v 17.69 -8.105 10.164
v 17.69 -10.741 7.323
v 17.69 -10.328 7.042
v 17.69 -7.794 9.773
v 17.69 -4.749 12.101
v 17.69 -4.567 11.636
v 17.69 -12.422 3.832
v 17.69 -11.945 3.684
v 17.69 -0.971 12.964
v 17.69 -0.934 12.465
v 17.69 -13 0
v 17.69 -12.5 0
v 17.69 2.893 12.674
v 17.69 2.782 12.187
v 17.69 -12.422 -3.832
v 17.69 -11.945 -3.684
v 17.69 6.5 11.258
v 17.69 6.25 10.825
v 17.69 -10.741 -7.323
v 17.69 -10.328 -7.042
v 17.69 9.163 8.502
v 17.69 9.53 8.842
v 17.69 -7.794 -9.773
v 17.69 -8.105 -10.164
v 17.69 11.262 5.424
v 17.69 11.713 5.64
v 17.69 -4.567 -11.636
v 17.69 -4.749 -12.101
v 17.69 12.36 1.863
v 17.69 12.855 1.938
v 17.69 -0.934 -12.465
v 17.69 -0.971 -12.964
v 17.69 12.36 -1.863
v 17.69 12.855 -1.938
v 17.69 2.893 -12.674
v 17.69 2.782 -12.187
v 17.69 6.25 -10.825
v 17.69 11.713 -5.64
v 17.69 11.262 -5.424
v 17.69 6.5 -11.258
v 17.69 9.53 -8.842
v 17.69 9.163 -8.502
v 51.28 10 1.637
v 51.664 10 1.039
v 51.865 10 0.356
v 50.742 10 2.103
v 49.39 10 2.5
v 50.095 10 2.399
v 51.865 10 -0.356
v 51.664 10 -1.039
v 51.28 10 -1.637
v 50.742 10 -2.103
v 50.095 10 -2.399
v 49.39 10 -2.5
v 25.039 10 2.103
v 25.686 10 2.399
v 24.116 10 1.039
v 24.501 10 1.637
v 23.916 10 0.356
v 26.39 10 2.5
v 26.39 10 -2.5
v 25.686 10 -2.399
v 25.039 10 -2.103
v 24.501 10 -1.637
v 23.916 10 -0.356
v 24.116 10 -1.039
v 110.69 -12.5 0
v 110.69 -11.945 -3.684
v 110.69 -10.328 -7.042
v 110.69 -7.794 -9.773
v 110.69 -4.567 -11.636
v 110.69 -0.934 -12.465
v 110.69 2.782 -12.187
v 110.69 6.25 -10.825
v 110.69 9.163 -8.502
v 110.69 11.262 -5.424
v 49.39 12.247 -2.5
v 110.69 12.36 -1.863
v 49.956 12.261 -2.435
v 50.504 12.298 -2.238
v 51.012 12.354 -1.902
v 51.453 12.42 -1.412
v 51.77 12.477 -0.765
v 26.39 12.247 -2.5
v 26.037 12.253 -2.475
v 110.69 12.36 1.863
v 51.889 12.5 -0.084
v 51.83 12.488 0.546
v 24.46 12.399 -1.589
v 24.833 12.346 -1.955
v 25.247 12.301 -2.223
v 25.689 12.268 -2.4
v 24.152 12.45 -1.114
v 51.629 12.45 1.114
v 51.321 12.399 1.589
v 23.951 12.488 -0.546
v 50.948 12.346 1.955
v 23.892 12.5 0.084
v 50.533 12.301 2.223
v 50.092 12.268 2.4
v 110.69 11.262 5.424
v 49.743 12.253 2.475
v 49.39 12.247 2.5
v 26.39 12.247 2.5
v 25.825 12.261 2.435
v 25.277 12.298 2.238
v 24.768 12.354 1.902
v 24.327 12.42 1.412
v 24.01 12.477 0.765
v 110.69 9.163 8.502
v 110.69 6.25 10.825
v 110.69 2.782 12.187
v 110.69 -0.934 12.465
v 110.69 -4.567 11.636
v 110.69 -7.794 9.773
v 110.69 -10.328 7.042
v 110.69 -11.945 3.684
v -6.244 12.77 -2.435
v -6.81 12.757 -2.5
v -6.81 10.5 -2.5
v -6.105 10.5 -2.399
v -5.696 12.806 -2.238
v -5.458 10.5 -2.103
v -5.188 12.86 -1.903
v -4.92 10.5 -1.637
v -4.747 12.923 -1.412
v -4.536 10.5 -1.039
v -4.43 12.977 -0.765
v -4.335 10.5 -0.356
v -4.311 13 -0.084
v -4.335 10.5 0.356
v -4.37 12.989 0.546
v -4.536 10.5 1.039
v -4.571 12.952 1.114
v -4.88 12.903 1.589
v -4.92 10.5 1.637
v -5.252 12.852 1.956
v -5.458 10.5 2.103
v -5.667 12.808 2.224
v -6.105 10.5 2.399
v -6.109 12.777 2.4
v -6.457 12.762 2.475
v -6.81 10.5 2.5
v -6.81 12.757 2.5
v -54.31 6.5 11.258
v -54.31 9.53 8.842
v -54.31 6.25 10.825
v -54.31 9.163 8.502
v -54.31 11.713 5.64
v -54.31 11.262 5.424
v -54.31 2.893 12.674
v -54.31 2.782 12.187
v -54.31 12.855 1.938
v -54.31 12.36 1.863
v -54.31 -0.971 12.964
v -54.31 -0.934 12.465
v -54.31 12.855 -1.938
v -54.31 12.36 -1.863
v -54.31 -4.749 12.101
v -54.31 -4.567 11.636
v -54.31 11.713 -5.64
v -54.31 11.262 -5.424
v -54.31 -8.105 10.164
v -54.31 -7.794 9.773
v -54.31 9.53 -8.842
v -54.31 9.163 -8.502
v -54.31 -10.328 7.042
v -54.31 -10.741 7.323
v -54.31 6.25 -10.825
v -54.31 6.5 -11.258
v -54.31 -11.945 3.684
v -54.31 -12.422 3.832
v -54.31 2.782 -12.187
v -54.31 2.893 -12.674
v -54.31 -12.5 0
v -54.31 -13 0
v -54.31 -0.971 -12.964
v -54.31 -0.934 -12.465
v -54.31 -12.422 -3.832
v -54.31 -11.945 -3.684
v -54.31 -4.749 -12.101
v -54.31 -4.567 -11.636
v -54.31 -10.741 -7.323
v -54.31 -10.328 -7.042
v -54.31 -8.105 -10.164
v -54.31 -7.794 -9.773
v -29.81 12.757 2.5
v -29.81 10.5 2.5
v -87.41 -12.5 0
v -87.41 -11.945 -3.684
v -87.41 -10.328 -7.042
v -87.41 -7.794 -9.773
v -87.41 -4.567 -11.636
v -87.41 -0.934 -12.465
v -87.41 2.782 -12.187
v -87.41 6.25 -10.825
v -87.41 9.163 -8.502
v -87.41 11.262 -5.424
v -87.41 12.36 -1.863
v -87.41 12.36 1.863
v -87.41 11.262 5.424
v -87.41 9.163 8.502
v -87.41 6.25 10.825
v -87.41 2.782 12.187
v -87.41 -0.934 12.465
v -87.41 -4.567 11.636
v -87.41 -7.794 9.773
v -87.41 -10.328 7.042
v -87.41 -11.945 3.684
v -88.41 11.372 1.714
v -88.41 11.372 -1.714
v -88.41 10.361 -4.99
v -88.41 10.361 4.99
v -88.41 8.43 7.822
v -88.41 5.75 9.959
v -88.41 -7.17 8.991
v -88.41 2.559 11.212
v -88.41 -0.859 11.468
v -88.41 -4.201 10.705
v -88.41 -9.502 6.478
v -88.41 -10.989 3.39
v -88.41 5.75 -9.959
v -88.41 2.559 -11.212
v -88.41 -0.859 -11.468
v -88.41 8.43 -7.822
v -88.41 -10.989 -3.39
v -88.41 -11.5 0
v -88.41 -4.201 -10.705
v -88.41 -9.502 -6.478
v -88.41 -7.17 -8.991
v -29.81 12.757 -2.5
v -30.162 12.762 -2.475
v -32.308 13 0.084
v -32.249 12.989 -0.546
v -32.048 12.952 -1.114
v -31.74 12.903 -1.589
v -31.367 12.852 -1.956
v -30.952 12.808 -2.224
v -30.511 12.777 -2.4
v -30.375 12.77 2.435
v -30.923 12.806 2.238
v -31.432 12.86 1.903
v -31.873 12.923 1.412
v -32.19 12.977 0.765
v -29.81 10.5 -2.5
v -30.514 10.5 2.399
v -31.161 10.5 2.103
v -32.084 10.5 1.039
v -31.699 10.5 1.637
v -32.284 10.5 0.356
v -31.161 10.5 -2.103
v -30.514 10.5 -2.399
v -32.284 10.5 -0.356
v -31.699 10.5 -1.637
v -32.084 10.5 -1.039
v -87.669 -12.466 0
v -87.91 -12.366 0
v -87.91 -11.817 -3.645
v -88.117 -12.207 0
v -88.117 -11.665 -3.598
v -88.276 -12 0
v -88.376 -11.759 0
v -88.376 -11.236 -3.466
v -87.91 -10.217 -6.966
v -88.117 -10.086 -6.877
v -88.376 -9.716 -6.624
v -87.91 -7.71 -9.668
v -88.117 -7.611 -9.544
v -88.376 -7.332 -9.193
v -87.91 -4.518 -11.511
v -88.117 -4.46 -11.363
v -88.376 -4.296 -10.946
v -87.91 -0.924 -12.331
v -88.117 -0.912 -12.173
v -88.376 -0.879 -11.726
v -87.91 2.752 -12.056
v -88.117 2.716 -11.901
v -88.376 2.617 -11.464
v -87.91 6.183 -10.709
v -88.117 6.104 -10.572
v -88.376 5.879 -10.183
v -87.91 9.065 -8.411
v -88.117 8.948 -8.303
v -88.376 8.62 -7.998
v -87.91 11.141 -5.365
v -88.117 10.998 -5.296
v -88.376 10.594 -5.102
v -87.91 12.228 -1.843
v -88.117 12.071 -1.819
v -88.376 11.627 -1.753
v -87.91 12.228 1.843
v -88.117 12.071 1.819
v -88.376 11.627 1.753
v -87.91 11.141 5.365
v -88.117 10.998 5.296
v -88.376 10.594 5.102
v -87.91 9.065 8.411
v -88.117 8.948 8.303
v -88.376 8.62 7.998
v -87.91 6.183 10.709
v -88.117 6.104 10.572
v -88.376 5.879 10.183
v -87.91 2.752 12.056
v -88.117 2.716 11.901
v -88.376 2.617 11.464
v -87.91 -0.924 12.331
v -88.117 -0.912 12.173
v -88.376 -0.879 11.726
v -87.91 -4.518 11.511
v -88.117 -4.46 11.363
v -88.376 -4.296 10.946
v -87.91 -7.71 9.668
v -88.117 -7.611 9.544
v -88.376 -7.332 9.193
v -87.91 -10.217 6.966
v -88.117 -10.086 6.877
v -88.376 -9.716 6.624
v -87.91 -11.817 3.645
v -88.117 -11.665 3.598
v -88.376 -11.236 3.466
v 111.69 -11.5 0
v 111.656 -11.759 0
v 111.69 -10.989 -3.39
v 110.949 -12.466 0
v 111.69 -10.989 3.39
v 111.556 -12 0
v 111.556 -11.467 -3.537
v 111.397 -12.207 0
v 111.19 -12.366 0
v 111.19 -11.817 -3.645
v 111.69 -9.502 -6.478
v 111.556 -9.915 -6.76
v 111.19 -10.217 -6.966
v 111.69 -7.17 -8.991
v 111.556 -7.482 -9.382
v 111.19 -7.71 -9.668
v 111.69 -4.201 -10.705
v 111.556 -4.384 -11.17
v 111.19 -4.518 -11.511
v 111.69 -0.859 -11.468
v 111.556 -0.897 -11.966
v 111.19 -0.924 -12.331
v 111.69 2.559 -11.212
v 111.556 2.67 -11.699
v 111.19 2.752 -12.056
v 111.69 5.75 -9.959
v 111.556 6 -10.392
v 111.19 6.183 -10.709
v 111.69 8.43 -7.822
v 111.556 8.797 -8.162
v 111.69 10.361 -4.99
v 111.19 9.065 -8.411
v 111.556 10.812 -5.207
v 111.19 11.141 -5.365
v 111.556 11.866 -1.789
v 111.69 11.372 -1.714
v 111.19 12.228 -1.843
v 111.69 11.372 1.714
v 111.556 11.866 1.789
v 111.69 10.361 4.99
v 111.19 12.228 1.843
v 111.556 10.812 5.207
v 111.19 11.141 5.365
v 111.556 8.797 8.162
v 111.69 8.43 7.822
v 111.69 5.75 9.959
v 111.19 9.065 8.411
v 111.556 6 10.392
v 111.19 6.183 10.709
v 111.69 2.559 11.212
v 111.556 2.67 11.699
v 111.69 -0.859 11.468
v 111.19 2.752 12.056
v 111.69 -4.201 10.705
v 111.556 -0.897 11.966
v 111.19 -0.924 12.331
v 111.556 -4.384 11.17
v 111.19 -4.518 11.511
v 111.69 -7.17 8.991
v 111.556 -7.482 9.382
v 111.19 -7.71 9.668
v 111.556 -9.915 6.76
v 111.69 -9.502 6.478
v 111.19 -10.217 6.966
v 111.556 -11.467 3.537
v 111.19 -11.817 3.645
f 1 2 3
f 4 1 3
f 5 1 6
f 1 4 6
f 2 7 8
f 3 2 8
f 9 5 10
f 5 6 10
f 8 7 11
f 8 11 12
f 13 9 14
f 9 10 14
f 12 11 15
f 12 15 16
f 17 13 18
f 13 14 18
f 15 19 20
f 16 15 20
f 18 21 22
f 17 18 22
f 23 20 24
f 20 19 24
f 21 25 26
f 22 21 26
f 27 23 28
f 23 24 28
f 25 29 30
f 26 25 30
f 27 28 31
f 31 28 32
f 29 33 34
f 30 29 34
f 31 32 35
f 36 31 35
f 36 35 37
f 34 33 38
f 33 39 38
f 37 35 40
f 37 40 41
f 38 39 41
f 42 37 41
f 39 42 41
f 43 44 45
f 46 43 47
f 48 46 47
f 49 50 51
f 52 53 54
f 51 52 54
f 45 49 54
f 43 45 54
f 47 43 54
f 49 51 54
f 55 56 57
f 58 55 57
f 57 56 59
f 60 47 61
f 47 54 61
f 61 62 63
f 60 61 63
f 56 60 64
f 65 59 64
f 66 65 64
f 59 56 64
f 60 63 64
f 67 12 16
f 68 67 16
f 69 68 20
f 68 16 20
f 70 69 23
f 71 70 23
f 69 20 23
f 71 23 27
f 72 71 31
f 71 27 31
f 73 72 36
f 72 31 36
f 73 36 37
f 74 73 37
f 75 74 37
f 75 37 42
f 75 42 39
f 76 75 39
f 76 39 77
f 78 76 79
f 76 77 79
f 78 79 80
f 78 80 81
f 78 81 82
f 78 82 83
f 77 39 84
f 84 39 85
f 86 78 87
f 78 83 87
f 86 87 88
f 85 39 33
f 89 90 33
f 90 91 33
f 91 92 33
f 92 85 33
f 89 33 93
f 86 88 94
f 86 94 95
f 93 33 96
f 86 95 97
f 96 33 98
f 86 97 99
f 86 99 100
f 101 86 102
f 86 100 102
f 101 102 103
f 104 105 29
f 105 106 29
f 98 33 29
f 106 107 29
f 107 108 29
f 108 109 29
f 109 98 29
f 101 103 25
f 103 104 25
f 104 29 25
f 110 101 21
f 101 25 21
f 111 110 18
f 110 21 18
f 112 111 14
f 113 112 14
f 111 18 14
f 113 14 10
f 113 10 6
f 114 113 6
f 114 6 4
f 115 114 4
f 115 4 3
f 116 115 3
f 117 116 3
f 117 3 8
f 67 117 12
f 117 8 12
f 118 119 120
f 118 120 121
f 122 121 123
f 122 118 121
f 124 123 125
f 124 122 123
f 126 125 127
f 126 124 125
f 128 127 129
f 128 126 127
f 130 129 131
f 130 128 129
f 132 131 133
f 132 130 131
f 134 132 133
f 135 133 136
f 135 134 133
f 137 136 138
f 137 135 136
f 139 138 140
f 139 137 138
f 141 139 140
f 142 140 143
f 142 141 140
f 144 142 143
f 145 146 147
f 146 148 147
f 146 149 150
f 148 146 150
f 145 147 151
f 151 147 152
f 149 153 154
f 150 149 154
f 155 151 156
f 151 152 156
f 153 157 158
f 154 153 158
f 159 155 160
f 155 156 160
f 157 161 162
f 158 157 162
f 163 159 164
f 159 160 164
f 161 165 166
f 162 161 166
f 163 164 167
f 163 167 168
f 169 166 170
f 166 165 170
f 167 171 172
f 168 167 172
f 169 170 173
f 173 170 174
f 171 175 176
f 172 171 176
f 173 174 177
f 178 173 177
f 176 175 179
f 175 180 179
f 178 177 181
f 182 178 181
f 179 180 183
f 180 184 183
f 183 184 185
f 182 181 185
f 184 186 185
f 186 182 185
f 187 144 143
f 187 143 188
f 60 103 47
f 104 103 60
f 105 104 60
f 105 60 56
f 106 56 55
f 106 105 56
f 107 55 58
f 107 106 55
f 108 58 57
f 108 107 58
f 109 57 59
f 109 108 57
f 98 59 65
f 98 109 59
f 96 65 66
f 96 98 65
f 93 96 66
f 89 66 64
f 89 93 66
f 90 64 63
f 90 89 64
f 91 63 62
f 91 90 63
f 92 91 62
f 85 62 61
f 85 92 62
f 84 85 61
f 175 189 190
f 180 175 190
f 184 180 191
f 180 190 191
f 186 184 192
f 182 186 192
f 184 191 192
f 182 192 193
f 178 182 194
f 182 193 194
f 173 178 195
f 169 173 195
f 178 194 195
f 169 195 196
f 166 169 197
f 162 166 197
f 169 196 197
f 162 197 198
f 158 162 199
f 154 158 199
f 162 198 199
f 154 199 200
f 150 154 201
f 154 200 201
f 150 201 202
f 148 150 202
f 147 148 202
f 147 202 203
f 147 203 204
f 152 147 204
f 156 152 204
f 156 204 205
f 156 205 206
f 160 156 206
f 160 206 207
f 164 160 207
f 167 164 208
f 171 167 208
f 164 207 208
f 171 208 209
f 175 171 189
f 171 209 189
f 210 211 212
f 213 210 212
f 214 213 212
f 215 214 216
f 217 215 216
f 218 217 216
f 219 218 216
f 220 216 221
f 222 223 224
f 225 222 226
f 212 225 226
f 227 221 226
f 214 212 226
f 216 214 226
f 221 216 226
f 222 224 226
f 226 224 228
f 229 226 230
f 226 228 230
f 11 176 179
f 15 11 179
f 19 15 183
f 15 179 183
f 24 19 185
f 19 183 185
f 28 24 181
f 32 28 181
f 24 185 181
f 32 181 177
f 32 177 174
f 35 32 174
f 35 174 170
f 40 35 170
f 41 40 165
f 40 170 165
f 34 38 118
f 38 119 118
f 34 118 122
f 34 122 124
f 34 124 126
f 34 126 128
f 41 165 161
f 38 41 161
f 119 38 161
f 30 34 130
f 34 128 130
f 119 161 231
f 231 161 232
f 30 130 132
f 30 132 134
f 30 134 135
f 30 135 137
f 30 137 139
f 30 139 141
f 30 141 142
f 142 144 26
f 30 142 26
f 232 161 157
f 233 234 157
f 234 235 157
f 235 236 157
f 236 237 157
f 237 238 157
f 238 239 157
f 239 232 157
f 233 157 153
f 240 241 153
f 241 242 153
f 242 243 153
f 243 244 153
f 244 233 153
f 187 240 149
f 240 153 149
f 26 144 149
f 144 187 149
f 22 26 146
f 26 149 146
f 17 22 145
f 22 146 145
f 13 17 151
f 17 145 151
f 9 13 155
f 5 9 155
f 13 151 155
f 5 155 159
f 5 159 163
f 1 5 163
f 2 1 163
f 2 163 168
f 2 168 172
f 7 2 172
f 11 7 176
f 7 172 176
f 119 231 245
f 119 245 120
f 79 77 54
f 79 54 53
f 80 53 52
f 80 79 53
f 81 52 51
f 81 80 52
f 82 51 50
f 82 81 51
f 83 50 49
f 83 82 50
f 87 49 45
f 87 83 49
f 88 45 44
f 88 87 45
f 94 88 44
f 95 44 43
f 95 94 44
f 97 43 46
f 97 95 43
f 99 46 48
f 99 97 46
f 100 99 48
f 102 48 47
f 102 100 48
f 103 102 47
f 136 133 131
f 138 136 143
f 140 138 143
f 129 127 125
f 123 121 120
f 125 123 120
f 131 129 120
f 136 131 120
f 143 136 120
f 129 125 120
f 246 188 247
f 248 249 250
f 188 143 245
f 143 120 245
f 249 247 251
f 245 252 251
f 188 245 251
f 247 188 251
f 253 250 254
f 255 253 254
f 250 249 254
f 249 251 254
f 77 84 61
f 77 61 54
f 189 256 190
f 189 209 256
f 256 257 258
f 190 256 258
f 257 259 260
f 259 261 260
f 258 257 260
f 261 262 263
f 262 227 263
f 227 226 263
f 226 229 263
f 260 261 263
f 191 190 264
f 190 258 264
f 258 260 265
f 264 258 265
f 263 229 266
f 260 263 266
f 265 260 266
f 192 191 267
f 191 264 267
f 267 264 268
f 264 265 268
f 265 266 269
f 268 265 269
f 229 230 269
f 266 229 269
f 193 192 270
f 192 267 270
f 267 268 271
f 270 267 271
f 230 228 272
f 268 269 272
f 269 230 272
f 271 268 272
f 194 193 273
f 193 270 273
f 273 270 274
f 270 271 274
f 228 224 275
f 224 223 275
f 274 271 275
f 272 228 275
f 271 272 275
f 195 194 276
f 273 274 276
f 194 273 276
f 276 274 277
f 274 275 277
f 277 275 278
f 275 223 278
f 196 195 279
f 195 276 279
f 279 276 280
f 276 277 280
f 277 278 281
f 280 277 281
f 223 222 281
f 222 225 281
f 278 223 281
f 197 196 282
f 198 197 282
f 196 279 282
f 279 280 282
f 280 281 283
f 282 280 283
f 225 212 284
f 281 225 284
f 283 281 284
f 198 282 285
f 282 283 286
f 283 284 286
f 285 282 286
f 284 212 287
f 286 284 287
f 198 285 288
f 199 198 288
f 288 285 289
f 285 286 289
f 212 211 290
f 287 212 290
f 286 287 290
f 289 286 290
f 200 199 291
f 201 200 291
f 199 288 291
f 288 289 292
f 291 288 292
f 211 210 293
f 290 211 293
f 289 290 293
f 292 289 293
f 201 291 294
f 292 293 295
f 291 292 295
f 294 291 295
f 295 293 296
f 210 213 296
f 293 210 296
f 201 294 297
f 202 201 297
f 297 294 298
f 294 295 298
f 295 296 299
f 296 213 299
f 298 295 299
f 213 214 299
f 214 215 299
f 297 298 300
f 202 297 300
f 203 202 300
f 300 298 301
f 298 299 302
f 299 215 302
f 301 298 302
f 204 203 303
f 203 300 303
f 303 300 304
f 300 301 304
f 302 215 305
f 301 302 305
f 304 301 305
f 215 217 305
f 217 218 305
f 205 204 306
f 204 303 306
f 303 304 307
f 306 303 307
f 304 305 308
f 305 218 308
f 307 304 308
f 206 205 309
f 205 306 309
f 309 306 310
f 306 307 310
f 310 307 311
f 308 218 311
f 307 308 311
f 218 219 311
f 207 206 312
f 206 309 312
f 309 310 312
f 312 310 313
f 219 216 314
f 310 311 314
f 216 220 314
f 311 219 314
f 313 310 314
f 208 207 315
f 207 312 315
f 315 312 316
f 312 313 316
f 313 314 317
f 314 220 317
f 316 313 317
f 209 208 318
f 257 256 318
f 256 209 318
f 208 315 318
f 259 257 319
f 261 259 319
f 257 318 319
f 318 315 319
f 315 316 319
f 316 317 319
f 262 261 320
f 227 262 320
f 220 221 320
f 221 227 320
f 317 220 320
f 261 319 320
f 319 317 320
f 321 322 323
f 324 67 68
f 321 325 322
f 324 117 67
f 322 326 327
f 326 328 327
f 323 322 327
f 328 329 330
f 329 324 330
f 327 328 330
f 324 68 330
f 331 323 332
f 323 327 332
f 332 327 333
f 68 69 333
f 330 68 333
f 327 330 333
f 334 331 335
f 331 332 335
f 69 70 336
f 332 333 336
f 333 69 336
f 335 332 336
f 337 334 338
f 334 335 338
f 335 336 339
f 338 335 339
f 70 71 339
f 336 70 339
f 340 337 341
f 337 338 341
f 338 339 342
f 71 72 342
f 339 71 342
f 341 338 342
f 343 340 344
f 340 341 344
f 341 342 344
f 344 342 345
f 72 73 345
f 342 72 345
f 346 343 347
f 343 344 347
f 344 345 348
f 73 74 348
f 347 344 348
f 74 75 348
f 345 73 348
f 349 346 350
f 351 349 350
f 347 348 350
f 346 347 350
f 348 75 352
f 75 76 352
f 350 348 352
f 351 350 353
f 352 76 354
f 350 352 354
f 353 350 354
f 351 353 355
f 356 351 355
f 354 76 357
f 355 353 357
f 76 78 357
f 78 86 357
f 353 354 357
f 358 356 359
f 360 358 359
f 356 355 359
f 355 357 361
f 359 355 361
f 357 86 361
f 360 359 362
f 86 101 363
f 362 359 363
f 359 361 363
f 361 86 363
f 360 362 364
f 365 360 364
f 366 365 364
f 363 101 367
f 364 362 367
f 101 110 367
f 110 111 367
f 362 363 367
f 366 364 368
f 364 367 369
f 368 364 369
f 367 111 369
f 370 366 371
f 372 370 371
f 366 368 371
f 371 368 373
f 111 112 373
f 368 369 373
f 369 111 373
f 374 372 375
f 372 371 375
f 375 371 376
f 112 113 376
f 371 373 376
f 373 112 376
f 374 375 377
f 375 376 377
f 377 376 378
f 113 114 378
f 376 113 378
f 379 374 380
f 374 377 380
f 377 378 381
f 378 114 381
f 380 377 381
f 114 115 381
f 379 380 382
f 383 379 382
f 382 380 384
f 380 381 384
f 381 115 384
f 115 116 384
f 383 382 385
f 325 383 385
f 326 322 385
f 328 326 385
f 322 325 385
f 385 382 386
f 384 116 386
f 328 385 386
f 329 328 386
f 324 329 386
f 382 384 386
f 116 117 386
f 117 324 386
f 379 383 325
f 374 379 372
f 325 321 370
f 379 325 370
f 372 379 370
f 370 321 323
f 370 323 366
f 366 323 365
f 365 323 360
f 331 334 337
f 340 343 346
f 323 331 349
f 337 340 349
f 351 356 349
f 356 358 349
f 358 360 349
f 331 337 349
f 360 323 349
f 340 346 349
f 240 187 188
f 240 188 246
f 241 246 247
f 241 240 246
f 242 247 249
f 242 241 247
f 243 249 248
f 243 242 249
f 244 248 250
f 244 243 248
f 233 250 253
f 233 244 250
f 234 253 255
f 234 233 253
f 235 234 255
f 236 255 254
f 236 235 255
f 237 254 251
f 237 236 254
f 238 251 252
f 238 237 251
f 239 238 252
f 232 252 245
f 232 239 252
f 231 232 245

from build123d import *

# Parameters (mm, degrees)
CUT_EXTRUDE1_DEPTH = 2.5
FILLET4_R          = 1
FILLET5_R          = 1
CUT_EXTRUDE3_DEPTH = 2.5


with BuildPart() as part:
    # Sketch1 → Revolve1 (revolve)
    with BuildSketch(Plane.XY, mode=Mode.PRIVATE) as revolve1_sk:
        Polygon((111.690273615, 0), (111.690273615, 12.5), (17.690273615, 12.5), (17.690273615, 13), (-54.309726385, 13), (-54.309726385, 12.5), (-88.409726385, 12.5), (-88.409726385, 0), align=None)
    revolve(revolve1_sk.sketch.rotate(Axis((-88.409726385, 0, 0), (1, 0, 0)), 180), axis=Axis((-88.409726385, 0, 0), (1, 0, 0)))

    # Sketch2 → Cut-Extrude1 (cut)
    with BuildSketch(Plane(origin=(0, 12.5, 0), x_dir=(1, 0, 0), z_dir=(0, 1, 0))):
        with BuildLine():
            Line((26.390273615, 2.5), (49.390273615, 2.5))
            ThreePointArc((49.390273615, 2.5), (51.890273615, 0), (49.390273615, -2.5))
            Line((49.390273615, -2.5), (26.390273615, -2.5))
            ThreePointArc((26.390273615, -2.5), (23.890273615, 0), (26.390273615, 2.5))
        make_face()
    extrude(amount=-CUT_EXTRUDE1_DEPTH, mode=Mode.SUBTRACT)

    # Fillet4
    fillet4_edges = [part.edges().sort_by_distance(p)[0] for p in [
        (111.690273615, 12.5, 0),
    ]]
    fillet(fillet4_edges, radius=FILLET4_R)

    # Fillet5
    fillet5_edges = [part.edges().sort_by_distance(p)[0] for p in [
        (-88.409726385, 12.5, 0),
    ]]
    fillet(fillet5_edges, radius=FILLET5_R)

    # Sketch3 → Cut-Extrude3 (cut)
    with BuildSketch(Plane(origin=(0, 13, 0), x_dir=(1, 0, 0), z_dir=(0, 1, 0))):
        with BuildLine():
            Line((-29.809726385, 2.5), (-6.809726385, 2.5))
            ThreePointArc((-6.809726385, 2.5), (-4.309726385, 0), (-6.809726385, -2.5))
            Line((-6.809726385, -2.5), (-29.809726385, -2.5))
            ThreePointArc((-29.809726385, -2.5), (-32.309726385, 0), (-29.809726385, 2.5))
        make_face()
    extrude(amount=-CUT_EXTRUDE3_DEPTH, mode=Mode.SUBTRACT)


solid = part.part
